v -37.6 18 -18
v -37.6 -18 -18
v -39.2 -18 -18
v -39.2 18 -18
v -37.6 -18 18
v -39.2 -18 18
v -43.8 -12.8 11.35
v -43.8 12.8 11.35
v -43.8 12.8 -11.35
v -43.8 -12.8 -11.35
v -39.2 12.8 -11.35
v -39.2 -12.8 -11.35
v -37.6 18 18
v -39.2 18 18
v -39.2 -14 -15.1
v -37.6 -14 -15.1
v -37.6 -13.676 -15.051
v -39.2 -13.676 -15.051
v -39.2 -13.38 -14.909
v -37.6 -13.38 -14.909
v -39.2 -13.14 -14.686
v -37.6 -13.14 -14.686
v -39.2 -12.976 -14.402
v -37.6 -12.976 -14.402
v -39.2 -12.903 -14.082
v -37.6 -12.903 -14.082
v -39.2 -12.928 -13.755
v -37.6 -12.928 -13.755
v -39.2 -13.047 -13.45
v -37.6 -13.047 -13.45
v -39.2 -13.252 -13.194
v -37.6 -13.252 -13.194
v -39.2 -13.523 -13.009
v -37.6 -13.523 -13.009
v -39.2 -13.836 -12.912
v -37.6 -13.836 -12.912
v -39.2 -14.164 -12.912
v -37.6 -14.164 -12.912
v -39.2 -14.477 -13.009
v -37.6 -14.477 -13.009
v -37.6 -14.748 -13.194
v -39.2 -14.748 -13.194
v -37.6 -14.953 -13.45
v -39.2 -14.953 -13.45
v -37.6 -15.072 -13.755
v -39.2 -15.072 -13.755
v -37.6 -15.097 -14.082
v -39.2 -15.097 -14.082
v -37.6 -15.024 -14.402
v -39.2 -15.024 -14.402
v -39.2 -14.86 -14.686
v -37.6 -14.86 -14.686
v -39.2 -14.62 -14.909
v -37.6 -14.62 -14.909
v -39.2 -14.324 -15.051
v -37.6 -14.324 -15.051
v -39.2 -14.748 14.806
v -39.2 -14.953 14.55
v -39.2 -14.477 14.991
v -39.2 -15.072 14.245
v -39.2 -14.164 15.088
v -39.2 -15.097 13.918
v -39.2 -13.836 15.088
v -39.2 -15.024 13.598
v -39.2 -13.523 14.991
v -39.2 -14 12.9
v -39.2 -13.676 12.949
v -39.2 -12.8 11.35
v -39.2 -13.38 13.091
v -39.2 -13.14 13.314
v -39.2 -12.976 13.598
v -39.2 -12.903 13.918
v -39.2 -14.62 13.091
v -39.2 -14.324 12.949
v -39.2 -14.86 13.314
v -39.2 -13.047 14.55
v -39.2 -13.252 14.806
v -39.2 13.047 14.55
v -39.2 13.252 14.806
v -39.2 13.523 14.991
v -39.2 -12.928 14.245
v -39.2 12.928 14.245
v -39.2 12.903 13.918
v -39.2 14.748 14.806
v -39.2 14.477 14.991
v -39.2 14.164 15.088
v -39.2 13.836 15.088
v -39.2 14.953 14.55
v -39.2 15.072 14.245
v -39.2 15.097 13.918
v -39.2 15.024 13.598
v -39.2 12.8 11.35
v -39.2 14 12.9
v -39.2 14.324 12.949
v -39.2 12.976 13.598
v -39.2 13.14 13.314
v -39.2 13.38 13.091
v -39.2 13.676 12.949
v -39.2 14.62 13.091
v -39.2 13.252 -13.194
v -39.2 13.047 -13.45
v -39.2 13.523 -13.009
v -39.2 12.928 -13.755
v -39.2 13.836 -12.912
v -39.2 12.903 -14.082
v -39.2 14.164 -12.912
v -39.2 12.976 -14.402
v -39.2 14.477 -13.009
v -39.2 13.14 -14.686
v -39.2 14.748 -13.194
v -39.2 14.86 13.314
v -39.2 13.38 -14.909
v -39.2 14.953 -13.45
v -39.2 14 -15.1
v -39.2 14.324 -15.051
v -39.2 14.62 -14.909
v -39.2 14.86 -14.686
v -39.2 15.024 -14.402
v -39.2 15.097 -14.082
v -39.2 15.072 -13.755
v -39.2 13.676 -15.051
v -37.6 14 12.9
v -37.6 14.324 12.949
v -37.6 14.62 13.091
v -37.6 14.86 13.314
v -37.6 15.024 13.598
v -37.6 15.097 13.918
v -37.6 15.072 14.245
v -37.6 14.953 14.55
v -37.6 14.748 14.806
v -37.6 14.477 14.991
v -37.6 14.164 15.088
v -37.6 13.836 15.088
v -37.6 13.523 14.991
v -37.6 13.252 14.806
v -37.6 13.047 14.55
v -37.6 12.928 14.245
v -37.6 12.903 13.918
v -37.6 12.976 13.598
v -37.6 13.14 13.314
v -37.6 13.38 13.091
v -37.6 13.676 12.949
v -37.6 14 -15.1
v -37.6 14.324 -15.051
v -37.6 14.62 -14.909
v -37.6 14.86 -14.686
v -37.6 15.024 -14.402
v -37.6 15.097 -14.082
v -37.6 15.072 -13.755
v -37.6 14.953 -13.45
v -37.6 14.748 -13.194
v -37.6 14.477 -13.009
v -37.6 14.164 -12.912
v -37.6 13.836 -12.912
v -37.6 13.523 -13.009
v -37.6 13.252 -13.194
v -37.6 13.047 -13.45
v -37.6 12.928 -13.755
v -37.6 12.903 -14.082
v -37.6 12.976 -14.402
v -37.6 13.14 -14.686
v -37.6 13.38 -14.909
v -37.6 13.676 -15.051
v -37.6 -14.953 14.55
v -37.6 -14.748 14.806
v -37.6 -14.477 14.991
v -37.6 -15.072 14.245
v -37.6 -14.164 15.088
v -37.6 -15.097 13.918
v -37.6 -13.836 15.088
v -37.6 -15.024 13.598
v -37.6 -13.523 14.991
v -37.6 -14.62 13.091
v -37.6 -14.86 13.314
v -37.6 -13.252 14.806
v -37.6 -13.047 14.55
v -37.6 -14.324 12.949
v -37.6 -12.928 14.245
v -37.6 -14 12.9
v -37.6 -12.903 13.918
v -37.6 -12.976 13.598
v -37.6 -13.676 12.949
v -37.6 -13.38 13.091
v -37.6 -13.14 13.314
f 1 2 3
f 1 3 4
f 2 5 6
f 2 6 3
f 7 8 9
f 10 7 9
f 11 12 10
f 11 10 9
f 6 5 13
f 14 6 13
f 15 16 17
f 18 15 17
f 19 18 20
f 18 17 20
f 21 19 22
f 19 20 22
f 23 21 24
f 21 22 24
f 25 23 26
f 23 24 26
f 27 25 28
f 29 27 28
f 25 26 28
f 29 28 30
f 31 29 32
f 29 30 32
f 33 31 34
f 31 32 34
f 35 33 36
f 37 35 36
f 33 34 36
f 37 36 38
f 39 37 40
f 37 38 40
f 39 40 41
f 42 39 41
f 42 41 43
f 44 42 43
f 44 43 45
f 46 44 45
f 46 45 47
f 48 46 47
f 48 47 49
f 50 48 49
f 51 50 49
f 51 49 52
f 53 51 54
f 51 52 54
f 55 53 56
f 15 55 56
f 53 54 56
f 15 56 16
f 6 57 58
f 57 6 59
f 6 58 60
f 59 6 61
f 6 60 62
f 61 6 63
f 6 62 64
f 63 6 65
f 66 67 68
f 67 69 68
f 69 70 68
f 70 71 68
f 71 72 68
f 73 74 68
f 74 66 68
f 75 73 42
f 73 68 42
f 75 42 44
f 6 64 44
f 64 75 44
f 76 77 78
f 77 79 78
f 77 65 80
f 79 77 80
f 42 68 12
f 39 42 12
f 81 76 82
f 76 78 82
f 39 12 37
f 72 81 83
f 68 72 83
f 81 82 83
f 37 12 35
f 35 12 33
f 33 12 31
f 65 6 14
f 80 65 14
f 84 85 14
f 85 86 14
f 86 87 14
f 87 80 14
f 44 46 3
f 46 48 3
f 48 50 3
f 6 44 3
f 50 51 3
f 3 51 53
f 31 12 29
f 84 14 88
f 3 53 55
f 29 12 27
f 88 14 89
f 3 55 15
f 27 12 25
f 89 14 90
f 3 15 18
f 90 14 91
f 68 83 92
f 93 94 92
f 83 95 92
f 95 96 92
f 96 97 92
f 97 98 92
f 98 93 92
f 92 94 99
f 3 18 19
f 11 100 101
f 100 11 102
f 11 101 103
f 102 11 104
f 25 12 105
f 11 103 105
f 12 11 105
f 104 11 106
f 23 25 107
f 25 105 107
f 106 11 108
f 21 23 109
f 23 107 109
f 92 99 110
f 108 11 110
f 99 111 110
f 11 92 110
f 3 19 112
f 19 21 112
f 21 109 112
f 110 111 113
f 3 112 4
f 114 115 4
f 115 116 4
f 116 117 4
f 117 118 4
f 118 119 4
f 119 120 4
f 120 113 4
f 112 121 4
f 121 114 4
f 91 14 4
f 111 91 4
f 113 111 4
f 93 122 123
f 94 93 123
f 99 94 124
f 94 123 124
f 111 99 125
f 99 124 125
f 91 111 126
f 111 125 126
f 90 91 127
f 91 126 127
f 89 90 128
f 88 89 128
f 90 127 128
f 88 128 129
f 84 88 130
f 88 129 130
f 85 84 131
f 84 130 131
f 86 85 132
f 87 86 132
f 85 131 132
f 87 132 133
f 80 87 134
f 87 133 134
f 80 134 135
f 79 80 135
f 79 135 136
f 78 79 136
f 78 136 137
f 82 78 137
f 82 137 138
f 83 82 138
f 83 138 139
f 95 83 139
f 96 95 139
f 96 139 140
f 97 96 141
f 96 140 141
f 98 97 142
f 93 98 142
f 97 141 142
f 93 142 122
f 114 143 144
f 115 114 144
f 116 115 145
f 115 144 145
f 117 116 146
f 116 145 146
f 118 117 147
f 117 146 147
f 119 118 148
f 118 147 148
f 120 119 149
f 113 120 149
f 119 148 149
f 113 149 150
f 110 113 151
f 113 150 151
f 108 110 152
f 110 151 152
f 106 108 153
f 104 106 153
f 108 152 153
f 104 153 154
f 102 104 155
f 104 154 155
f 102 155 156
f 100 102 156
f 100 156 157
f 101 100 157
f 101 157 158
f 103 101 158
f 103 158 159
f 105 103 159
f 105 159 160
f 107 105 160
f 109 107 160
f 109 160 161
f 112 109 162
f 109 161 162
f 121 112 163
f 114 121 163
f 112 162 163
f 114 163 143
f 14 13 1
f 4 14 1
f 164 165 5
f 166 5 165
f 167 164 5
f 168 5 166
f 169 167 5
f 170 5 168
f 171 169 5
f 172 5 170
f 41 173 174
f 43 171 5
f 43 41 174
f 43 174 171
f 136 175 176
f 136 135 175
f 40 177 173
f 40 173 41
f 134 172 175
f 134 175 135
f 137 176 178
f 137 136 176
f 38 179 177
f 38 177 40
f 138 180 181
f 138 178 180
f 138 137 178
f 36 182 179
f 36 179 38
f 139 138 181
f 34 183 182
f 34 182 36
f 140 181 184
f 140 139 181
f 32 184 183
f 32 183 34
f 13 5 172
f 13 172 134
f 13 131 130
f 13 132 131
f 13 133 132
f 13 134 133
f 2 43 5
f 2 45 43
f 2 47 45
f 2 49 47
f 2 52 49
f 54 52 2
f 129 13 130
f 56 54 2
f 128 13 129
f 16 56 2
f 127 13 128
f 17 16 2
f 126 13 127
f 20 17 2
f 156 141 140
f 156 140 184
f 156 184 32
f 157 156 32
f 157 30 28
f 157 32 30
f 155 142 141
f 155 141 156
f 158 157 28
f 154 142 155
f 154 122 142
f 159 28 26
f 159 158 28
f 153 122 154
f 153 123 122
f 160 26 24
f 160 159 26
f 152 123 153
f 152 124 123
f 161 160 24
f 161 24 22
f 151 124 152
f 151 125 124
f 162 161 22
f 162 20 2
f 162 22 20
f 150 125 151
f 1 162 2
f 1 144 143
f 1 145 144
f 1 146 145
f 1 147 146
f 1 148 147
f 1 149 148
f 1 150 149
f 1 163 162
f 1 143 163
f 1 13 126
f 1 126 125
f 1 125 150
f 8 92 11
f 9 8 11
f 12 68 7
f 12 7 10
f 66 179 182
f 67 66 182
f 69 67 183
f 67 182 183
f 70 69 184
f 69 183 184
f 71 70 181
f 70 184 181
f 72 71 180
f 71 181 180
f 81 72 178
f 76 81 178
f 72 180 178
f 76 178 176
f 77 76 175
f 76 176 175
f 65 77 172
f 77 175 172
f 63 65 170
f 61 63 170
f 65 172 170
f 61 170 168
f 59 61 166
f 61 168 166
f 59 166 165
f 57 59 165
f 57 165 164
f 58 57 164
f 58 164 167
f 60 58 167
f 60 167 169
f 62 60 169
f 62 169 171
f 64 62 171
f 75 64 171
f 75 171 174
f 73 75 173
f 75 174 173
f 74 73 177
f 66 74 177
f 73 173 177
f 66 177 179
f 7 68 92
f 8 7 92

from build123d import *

# Parameters (mm, degrees)
PLATE_START     = -37.6
PLATE_SKETCH_W  = 36
PLATE_SKETCH_H  = 36
PLATE_SKETCH_R  = 1.1
PLATE_DEPTH     = 1.6
BNO085_START    = -39.2
BNO085_SKETCH_W = 22.7
BNO085_SKETCH_H = 25.6
BNO085_DEPTH    = 4.6


with BuildPart() as part:
    # Plate Sketch → Plate (new body)
    with BuildSketch(Plane(origin=(0, 0, 0), x_dir=(0, 0, -1), z_dir=(1, 0, 0)).offset(PLATE_START)):
        Rectangle(PLATE_SKETCH_W, PLATE_SKETCH_H)
        with Locations((14, -14)):
            Circle(PLATE_SKETCH_R, mode=Mode.SUBTRACT)
        with Locations((-14, -14)):
            Circle(PLATE_SKETCH_R, mode=Mode.SUBTRACT)
        with Locations((14, 14)):
            Circle(PLATE_SKETCH_R, mode=Mode.SUBTRACT)
        with Locations((-14, 14)):
            Circle(PLATE_SKETCH_R, mode=Mode.SUBTRACT)
    extrude(amount=-PLATE_DEPTH)

    # BNO085 Sketch → BNO085 (add)
    with BuildSketch(Plane(origin=(0, 0, 0), x_dir=(0, 0, -1), z_dir=(1, 0, 0)).offset(BNO085_START)):
        Rectangle(BNO085_SKETCH_W, BNO085_SKETCH_H)
    extrude(amount=-BNO085_DEPTH)


solid = part.part
